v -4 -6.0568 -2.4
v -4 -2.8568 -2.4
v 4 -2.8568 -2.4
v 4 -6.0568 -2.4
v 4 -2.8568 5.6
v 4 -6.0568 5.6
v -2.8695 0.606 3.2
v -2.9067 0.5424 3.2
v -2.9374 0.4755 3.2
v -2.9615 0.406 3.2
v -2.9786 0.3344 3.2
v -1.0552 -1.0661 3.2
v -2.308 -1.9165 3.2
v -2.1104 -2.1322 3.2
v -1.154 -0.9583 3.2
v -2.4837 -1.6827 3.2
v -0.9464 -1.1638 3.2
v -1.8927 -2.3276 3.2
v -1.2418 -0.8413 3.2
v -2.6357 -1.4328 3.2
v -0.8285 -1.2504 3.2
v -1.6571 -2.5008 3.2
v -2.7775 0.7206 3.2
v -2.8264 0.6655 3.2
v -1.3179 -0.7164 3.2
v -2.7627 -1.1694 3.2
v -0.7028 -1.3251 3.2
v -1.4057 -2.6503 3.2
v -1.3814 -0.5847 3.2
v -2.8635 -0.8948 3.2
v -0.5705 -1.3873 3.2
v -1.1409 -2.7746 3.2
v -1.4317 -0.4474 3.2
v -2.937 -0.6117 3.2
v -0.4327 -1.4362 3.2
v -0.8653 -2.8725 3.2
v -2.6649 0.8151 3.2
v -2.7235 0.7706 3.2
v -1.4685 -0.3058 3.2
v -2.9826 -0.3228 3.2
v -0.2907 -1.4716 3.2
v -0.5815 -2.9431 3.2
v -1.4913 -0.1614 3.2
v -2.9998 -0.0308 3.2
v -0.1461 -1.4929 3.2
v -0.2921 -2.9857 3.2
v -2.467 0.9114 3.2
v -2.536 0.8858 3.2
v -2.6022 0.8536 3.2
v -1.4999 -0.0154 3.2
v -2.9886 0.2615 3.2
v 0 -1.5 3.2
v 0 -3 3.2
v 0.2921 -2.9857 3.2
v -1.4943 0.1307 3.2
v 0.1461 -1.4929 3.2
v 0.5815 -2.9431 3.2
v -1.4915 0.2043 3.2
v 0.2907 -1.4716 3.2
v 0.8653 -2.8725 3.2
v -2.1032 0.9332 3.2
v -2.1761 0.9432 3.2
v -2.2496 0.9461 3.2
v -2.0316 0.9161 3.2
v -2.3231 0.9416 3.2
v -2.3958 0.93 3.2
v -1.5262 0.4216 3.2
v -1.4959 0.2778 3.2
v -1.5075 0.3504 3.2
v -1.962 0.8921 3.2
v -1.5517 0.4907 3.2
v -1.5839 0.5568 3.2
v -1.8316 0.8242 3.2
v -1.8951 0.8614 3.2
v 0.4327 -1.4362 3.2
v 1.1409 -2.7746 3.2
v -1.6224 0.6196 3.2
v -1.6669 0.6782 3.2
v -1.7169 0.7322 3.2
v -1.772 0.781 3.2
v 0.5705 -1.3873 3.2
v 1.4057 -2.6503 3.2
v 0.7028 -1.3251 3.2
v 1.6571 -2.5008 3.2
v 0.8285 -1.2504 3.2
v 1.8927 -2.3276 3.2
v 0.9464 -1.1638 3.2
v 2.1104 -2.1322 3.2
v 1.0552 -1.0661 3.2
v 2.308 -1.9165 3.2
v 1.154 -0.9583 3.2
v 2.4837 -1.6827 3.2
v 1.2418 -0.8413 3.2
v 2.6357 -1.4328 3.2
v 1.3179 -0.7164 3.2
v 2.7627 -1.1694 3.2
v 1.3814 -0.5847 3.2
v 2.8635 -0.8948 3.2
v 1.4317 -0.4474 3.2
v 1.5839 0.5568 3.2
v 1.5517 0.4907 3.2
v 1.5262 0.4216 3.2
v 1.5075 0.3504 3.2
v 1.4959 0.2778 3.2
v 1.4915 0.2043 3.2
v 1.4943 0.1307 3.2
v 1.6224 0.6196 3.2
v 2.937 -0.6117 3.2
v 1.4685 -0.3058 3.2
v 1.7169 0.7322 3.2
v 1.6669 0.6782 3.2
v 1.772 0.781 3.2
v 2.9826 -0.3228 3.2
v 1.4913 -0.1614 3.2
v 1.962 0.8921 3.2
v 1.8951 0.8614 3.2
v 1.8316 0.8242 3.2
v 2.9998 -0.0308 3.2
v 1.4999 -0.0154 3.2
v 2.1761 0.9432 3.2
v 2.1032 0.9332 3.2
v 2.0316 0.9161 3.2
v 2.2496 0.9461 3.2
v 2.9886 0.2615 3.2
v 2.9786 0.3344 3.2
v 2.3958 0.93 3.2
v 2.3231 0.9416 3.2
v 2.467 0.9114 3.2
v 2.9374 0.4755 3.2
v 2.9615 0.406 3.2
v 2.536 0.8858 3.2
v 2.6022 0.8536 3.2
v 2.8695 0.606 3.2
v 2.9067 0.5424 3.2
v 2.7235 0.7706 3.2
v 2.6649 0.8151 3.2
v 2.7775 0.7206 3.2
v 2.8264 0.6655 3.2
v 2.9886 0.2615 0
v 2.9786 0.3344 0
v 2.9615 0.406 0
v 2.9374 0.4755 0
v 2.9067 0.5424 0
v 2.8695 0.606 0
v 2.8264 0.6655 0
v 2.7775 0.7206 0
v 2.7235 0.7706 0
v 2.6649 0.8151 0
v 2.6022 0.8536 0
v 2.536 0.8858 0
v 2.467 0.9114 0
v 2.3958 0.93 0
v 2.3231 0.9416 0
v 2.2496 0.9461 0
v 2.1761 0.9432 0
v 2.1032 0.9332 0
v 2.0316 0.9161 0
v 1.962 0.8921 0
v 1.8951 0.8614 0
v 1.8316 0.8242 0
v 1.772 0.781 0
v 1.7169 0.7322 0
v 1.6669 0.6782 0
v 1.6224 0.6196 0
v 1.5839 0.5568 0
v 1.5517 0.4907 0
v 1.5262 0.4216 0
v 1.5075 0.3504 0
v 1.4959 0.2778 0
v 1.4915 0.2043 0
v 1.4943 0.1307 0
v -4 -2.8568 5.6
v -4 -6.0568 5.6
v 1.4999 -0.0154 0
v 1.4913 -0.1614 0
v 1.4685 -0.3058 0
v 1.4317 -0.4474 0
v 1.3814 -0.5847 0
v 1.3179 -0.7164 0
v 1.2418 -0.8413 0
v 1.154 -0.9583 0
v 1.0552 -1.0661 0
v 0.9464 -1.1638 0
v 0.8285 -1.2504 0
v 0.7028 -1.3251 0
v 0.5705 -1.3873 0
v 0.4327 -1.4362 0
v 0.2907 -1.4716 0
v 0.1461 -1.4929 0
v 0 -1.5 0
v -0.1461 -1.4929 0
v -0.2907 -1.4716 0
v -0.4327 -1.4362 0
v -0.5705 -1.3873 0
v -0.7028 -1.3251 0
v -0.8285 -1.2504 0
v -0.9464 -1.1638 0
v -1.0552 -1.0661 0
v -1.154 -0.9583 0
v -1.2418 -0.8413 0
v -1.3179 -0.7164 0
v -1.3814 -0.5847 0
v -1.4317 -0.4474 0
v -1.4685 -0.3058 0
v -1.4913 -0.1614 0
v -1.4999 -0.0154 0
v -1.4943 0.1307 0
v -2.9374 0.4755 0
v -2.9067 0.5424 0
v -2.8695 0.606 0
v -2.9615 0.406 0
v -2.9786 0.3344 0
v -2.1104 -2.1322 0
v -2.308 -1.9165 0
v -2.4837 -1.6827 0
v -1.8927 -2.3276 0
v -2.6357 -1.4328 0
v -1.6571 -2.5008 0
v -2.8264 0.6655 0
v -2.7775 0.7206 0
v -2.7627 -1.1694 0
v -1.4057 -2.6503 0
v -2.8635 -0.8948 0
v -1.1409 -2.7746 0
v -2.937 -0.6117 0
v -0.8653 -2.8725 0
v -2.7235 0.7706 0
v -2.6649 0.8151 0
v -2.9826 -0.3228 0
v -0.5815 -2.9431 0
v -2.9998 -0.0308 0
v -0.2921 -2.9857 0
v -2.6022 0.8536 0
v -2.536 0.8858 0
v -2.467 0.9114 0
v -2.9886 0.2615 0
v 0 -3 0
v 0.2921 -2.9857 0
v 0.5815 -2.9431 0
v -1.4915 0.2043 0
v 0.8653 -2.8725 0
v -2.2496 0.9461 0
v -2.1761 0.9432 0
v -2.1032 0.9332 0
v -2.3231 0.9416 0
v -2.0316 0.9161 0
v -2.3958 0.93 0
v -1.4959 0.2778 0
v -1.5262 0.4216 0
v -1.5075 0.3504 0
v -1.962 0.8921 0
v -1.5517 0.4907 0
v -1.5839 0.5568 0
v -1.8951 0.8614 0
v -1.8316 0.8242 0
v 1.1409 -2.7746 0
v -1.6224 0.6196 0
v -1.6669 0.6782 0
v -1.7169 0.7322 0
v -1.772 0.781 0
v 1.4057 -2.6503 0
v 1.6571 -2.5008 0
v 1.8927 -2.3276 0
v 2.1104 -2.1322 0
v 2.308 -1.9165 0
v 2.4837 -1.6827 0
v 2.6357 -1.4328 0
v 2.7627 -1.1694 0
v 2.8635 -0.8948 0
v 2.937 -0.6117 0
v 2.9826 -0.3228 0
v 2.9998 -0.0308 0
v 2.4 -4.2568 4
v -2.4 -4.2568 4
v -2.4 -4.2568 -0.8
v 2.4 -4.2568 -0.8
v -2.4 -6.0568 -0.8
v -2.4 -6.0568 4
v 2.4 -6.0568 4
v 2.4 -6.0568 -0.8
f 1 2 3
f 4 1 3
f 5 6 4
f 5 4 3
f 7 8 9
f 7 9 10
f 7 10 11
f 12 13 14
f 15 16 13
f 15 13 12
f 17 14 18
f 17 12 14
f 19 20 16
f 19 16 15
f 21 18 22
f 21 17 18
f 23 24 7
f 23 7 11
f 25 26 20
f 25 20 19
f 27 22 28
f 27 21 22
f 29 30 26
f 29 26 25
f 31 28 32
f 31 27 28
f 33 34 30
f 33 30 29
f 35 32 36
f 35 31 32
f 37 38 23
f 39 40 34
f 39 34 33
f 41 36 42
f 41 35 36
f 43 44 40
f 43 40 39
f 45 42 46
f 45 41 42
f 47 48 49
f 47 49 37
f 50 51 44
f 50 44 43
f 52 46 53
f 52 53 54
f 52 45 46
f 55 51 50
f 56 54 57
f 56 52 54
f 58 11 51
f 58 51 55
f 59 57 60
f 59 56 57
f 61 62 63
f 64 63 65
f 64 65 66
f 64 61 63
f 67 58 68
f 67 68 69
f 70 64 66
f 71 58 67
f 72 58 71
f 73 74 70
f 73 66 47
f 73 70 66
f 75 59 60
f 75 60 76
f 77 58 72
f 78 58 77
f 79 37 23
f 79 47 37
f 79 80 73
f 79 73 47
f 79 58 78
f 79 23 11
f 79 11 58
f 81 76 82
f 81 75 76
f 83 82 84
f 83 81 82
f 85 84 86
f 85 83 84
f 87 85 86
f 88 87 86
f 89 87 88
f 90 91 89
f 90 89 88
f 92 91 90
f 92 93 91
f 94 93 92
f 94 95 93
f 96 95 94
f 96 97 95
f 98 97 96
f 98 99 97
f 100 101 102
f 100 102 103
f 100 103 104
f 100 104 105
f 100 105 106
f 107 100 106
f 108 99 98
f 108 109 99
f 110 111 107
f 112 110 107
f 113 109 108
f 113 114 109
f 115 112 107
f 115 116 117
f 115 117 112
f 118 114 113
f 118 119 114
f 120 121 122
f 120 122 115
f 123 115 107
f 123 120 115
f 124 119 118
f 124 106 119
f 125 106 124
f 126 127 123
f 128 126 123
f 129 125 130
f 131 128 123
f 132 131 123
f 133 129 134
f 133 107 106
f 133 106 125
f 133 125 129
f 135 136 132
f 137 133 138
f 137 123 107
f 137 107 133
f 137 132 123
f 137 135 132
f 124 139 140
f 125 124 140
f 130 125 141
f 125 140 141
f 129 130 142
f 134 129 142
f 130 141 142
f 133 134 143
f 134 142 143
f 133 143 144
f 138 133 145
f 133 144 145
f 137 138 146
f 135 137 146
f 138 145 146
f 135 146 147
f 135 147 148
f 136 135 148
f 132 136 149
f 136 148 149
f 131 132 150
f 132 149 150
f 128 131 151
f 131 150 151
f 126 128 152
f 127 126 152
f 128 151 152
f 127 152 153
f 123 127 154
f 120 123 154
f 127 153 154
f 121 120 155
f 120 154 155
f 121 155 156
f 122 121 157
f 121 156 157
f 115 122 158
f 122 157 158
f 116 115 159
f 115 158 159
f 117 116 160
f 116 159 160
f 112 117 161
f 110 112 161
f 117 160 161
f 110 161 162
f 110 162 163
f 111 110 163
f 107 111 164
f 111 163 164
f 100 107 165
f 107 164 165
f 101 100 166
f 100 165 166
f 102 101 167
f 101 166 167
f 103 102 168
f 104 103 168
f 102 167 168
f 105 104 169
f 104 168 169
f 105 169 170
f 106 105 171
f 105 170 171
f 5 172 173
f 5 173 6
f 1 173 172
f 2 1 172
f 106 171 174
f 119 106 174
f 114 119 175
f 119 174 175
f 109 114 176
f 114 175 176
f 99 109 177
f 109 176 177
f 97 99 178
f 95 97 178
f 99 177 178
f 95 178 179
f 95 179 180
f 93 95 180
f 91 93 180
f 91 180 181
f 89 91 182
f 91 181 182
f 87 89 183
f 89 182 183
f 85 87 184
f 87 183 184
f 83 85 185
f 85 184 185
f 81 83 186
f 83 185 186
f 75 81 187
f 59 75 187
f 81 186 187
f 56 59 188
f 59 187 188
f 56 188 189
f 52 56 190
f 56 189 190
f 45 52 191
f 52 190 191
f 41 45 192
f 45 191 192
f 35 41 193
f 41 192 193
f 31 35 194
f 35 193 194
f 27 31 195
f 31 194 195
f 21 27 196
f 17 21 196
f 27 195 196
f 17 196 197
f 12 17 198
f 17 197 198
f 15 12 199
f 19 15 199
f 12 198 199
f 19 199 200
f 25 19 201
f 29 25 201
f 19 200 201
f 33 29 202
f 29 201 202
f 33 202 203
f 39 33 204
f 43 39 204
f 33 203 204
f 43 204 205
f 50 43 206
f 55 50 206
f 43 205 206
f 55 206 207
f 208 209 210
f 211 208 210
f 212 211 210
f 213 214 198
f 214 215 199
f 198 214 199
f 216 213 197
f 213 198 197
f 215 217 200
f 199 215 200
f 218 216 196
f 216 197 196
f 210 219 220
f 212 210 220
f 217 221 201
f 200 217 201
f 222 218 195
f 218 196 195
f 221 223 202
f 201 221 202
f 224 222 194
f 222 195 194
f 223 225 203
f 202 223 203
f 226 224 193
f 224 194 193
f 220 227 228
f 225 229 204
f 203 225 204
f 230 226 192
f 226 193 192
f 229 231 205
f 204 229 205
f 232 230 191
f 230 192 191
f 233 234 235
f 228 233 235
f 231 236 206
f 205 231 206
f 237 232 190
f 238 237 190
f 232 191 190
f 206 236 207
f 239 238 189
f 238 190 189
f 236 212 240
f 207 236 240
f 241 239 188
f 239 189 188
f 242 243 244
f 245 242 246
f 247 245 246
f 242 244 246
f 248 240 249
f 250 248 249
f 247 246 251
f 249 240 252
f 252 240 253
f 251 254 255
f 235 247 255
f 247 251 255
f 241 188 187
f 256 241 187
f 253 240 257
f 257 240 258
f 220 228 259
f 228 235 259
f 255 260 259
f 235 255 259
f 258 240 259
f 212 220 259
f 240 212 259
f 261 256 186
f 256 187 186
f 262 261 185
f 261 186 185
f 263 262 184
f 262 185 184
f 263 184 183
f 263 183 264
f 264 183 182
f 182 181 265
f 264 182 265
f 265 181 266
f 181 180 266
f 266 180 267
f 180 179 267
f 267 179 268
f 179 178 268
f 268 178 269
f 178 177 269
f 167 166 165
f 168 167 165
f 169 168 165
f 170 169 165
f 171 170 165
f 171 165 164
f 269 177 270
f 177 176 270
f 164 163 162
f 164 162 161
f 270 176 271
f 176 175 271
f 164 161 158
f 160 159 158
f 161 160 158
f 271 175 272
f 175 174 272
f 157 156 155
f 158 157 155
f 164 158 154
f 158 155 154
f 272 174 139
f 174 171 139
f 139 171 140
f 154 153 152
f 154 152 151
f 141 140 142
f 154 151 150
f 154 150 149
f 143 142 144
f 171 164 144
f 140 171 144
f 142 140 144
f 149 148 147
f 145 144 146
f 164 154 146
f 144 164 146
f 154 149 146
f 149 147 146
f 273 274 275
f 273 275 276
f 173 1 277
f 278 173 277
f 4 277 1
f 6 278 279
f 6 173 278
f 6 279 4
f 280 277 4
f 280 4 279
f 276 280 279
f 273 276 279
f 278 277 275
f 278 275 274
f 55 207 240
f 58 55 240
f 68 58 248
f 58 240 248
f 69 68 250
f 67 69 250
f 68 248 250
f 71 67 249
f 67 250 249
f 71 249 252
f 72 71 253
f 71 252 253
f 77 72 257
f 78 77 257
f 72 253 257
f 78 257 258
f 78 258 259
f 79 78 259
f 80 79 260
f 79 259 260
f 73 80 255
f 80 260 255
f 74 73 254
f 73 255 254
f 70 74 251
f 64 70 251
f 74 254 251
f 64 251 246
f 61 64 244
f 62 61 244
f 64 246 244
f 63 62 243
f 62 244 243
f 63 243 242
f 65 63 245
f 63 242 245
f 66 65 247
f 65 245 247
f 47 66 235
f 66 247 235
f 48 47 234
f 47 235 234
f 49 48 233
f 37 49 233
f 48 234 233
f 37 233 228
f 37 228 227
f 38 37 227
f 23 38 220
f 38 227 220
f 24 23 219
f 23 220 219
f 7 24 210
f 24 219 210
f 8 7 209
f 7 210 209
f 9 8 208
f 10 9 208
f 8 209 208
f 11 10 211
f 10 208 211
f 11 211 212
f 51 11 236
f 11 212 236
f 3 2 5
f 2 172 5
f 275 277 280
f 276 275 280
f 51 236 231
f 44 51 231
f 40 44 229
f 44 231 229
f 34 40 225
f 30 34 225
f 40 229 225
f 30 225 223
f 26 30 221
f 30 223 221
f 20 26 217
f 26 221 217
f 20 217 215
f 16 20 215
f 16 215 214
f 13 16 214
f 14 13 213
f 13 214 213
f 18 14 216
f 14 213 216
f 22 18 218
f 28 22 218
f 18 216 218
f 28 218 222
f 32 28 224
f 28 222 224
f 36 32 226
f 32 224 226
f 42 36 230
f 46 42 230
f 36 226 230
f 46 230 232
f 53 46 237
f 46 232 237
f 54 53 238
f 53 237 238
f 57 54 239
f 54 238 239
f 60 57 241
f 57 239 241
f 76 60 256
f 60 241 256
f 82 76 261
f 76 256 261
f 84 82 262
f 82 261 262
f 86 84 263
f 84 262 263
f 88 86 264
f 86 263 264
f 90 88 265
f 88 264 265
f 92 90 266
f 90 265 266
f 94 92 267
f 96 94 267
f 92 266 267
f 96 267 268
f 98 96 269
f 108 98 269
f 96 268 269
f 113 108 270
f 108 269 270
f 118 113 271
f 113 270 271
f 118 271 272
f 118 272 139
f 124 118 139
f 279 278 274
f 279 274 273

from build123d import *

# Parameters (mm, degrees)
BOSS_EXTRUDE1_DEPTH = 3.2
BOSS_EXTRUDE2_START = 1.6
SKETCH2_W           = 8
SKETCH2_H           = 3.2
BOSS_EXTRUDE2_DEPTH = 4
SKETCH3_W           = 4.8
SKETCH3_H           = 4.8
CUT_EXTRUDE1_DEPTH  = 1.8


with BuildPart() as part:
    # Sketch1 → Boss-Extrude1 (new body)
    with BuildSketch(Plane.XY):
        with BuildLine():
            ThreePointArc((-2.988584094, 0.261467228), (0, -3), (2.988584094, 0.261467228))
            ThreePointArc((2.988584094, 0.261467228), (2.176071264, 0.943246445), (1.494292047, 0.130733614))
            ThreePointArc((1.494292047, 0.130733614), (0, -1.5), (-1.494292047, 0.130733614))
            ThreePointArc((-1.494292047, 0.130733614), (-2.176071264, 0.943246445), (-2.988584094, 0.261467228))
        make_face()
    extrude(amount=BOSS_EXTRUDE1_DEPTH)


with BuildPart() as body_2:
    # Sketch2 → Boss-Extrude2 (new, symmetric)
    with BuildSketch(Plane.XY.offset(BOSS_EXTRUDE2_START)):
        with Locations((0, -4.456753555)):
            Rectangle(SKETCH2_W, SKETCH2_H)
    extrude(amount=BOSS_EXTRUDE2_DEPTH, both=True)

    # Sketch3 → Cut-Extrude1 (cut)
    with BuildSketch(Plane.XZ.offset(6.056753555)):
        with Locations((0, 1.6)):
            Rectangle(SKETCH3_W, SKETCH3_H)
    extrude(amount=-CUT_EXTRUDE1_DEPTH, mode=Mode.SUBTRACT)


solid = Compound([part.part, body_2.part])
